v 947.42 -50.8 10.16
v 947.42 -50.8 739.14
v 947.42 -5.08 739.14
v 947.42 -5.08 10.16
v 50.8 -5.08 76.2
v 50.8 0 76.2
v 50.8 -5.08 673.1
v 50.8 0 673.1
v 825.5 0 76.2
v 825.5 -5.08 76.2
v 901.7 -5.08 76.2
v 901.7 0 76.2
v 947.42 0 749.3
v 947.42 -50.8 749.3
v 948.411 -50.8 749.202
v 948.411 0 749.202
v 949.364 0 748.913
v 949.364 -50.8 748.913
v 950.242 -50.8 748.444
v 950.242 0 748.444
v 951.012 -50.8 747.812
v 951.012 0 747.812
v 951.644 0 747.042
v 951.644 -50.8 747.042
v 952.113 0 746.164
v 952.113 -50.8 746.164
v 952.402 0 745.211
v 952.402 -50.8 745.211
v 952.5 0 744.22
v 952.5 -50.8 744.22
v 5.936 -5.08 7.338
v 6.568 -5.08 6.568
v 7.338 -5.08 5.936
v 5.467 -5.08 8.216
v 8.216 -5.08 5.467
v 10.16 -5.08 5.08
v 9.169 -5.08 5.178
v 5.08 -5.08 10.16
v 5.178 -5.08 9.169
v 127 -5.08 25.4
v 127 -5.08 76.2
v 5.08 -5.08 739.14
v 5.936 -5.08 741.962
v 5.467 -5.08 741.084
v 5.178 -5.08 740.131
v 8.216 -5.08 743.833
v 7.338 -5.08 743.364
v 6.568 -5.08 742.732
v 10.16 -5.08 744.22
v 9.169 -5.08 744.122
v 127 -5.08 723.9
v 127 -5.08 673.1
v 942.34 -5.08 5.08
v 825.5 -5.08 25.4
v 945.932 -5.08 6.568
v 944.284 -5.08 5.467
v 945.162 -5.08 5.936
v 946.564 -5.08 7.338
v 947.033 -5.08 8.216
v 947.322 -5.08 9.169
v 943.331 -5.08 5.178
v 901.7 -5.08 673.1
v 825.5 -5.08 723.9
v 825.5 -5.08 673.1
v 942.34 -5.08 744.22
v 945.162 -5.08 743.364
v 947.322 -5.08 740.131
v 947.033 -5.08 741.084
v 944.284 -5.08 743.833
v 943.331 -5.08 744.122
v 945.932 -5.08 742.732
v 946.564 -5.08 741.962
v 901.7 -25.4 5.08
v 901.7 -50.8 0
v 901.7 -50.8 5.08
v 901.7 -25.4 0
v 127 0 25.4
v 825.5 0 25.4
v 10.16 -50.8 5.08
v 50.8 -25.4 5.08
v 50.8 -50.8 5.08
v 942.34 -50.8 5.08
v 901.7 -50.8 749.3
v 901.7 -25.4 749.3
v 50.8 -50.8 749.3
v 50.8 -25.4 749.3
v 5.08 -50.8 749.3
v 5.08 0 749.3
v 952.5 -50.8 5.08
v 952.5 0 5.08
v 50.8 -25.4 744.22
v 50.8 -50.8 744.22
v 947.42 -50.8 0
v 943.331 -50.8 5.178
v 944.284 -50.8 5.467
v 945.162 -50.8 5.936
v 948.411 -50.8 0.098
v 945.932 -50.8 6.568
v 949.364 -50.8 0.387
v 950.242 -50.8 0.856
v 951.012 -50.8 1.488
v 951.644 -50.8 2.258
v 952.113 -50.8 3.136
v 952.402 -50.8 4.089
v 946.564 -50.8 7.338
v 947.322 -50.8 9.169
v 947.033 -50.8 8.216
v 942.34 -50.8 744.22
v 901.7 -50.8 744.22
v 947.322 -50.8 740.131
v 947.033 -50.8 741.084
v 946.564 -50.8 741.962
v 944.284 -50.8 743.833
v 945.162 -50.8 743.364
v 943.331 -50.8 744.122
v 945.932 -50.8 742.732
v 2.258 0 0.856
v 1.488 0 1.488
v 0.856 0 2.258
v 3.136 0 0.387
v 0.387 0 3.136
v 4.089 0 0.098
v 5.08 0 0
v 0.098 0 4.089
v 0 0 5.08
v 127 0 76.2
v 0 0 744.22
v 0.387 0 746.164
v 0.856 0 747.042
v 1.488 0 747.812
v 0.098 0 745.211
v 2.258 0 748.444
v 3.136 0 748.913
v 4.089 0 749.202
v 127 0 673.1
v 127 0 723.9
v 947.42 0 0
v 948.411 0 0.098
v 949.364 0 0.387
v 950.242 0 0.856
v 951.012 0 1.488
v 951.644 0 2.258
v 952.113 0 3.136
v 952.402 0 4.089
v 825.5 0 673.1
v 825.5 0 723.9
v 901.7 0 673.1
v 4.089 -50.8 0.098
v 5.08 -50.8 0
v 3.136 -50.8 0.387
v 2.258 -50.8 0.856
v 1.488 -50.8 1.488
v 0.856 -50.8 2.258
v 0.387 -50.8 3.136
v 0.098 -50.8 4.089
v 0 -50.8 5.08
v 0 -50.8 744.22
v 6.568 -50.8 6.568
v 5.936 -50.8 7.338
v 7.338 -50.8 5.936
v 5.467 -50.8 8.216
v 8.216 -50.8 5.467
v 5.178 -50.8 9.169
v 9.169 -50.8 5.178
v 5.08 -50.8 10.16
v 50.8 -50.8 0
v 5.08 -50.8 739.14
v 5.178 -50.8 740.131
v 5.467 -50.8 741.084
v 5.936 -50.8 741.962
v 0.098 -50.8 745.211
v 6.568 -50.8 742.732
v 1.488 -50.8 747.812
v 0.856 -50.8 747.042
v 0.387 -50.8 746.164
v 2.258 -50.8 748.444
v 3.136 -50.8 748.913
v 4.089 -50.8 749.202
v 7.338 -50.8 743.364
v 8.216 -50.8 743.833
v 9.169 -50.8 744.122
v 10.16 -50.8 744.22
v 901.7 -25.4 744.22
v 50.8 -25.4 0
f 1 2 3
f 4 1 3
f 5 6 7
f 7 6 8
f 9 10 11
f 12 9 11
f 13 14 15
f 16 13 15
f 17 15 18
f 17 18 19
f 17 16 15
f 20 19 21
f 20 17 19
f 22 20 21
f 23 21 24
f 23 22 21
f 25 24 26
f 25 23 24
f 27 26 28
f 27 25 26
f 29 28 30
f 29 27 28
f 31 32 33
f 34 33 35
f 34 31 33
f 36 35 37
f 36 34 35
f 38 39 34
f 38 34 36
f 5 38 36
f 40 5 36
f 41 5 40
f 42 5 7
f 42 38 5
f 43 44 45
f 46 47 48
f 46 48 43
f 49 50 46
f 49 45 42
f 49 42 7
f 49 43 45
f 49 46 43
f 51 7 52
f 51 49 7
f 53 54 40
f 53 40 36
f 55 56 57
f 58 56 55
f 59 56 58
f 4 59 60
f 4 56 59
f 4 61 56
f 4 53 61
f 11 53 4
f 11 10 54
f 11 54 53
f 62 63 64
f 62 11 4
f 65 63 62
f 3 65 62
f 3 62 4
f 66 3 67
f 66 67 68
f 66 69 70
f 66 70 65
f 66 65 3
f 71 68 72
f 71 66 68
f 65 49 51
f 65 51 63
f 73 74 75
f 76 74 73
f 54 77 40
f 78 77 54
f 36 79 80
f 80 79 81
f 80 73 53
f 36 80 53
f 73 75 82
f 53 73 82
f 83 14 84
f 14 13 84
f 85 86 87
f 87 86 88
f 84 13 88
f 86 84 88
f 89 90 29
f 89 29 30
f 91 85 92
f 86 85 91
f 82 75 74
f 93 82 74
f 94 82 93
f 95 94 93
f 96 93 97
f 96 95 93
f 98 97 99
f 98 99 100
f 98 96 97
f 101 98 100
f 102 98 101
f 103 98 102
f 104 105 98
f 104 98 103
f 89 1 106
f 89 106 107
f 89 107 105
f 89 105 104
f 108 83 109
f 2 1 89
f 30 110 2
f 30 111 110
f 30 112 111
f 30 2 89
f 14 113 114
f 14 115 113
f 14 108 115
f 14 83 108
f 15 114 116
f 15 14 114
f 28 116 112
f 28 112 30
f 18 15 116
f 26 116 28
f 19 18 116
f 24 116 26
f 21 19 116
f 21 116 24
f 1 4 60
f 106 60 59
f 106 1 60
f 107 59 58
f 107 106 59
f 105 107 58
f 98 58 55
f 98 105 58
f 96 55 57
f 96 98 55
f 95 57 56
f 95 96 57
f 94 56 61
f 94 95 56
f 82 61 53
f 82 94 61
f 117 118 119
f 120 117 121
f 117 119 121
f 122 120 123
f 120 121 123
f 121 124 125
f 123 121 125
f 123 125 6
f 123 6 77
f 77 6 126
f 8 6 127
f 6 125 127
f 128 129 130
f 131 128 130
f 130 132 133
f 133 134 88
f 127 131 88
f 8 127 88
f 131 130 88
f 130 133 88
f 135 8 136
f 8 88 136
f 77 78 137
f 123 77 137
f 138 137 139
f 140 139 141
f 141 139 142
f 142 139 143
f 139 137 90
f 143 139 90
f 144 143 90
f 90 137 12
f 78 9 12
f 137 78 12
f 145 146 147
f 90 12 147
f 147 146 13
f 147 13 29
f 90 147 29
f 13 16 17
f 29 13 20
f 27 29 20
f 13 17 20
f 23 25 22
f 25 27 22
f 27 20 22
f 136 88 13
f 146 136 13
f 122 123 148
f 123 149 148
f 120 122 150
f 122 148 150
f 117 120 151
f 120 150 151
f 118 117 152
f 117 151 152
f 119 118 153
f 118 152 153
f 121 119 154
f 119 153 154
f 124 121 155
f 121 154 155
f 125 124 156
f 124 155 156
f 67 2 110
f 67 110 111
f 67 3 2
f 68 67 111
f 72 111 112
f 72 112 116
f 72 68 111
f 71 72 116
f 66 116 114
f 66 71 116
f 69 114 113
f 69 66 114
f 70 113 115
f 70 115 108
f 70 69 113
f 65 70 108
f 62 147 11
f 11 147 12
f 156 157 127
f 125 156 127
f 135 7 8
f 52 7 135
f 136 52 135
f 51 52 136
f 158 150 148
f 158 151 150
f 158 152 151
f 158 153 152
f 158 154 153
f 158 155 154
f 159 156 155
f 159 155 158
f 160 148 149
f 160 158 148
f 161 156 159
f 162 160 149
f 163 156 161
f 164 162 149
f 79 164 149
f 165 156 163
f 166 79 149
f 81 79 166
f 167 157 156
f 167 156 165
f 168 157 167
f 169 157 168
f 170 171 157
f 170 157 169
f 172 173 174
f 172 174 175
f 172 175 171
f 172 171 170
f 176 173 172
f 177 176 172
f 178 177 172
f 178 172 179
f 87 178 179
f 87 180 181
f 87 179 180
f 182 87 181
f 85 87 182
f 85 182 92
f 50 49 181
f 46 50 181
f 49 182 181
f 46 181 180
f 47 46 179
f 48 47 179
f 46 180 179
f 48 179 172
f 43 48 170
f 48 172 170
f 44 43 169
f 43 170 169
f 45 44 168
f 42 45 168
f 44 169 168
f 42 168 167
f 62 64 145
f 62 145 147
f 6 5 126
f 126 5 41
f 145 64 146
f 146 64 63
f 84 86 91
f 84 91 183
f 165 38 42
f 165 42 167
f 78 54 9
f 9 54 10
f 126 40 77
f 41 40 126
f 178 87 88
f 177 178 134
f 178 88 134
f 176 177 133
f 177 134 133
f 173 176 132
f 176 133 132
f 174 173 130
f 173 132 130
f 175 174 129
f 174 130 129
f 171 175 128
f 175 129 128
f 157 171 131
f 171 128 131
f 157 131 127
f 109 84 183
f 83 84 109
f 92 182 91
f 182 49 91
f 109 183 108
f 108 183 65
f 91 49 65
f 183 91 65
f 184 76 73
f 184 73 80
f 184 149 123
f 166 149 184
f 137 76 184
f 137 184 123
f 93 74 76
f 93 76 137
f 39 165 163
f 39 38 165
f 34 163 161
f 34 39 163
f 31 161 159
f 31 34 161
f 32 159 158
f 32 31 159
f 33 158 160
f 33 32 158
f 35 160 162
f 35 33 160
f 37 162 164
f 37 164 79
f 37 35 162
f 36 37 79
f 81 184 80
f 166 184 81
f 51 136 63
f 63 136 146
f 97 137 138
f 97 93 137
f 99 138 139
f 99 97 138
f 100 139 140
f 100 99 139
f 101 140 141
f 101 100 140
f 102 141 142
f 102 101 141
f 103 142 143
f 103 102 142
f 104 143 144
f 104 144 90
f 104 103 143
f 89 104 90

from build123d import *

# Parameters (mm, degrees)
F0_W      = 850.9
F0_H      = 25.4
F1_DEPTH  = 5.08
F3_DEPTH  = 5.08
F5_DEPTH  = 5.08
F7_DEPTH  = 5.08
F8_W      = 50.8
F8_H      = 749.3
F9_DEPTH  = 5.08
F10_R     = 5.08
F11_W     = 76.2
F11_H     = 50.8
F12_DEPTH = 5.08


with BuildPart() as f1:
    # F0 (on Front) → F1 (new body)
    with BuildSketch(Plane.XZ):
        Polygon((50.8, 50.8), (0, 0), (50.8, 0), (50.8, 25.4), align=None)
        Polygon((0, 749.3), (0, 0), (50.8, 50.8), (50.8, 698.5), align=None)
        Polygon((50.8, 749.3), (0, 749.3), (50.8, 698.5), (50.8, 723.9), align=None)
        with Locations((476.25, 12.7)):
            Rectangle(F0_W, F0_H)
        with Locations((476.25, 736.6)):
            Rectangle(F0_W, F0_H)
        Polygon((901.7, 25.4), (901.7, 0), (952.5, 0), (901.7, 50.8), align=None)
        Polygon((952.5, 749.3), (901.7, 749.3), (901.7, 723.9), (901.7, 698.5), align=None)
        Polygon((901.7, 50.8), (952.5, 0), (952.5, 749.3), (901.7, 698.5), align=None)
    extrude(amount=F1_DEPTH)

    # F2 (on face) → F3 (join)
    with BuildSketch(Plane(origin=(0, 0, 0), x_dir=(1, 0, 0), z_dir=(0, 0, -1))):
        Polygon((0, 50.8), (0, 0), (952.5, 0), (952.5, 50.8), (901.7, 50.8), (901.7, 25.4), (50.8, 25.4), (50.8, 50.8), align=None)
    extrude(amount=-F3_DEPTH)

    # F4 (on face) → F5 (join)
    with BuildSketch(Plane.XY.offset(749.3)):
        Polygon((952.5, 0), (0, 0), (0, -50.8), (50.8, -50.8), (50.8, -25.4), (901.7, -25.4), (901.7, -50.8), (952.5, -50.8), align=None)
    extrude(amount=-F5_DEPTH)

    # F6 (on face) → F7 (join)
    with BuildSketch(Plane(origin=(0, 0, 0), x_dir=(0, -1, 0), z_dir=(-1, 0, 0))):
        Polygon((0.254638, 744.22), (0.254638, 0), (50.8, 0), (50.8, 749.3), align=None)
    extrude(amount=-F7_DEPTH)

    # F8 (on face) → F9 (join)
    with BuildSketch(Plane.YZ.offset(952.5)):
        with Locations((-25.4, 374.65)):
            Rectangle(F8_W, F8_H)
    extrude(amount=-F9_DEPTH)

    # F10
    f10_edges = [f1.edges().sort_by_distance(p)[0] for p in [
        (0, -25.4, 0),
        (5.08, -27.94, 5.08),
        (5.08, -27.94, 744.22),
        (0, -25.4, 749.3),
        (952.5, -25.4, 749.3),
        (947.42, -27.94, 744.22),
        (952.5, -25.4, 0),
        (947.42, -27.94, 5.08),
    ]]
    fillet(f10_edges, radius=F10_R)

    # F11 (on face) → F12 (join)
    with BuildSketch(Plane.XZ.offset(5.08)):
        with Locations((863.6, 698.5)):
            Rectangle(F11_W, F11_H)
        with Locations((863.6, 50.8)):
            Rectangle(F11_W, F11_H)
        with Locations((88.9, 50.8)):
            Rectangle(F11_W, F11_H)
        with Locations((88.9, 698.5)):
            Rectangle(F11_W, F11_H)
    extrude(amount=-F12_DEPTH)


solid = f1.part
